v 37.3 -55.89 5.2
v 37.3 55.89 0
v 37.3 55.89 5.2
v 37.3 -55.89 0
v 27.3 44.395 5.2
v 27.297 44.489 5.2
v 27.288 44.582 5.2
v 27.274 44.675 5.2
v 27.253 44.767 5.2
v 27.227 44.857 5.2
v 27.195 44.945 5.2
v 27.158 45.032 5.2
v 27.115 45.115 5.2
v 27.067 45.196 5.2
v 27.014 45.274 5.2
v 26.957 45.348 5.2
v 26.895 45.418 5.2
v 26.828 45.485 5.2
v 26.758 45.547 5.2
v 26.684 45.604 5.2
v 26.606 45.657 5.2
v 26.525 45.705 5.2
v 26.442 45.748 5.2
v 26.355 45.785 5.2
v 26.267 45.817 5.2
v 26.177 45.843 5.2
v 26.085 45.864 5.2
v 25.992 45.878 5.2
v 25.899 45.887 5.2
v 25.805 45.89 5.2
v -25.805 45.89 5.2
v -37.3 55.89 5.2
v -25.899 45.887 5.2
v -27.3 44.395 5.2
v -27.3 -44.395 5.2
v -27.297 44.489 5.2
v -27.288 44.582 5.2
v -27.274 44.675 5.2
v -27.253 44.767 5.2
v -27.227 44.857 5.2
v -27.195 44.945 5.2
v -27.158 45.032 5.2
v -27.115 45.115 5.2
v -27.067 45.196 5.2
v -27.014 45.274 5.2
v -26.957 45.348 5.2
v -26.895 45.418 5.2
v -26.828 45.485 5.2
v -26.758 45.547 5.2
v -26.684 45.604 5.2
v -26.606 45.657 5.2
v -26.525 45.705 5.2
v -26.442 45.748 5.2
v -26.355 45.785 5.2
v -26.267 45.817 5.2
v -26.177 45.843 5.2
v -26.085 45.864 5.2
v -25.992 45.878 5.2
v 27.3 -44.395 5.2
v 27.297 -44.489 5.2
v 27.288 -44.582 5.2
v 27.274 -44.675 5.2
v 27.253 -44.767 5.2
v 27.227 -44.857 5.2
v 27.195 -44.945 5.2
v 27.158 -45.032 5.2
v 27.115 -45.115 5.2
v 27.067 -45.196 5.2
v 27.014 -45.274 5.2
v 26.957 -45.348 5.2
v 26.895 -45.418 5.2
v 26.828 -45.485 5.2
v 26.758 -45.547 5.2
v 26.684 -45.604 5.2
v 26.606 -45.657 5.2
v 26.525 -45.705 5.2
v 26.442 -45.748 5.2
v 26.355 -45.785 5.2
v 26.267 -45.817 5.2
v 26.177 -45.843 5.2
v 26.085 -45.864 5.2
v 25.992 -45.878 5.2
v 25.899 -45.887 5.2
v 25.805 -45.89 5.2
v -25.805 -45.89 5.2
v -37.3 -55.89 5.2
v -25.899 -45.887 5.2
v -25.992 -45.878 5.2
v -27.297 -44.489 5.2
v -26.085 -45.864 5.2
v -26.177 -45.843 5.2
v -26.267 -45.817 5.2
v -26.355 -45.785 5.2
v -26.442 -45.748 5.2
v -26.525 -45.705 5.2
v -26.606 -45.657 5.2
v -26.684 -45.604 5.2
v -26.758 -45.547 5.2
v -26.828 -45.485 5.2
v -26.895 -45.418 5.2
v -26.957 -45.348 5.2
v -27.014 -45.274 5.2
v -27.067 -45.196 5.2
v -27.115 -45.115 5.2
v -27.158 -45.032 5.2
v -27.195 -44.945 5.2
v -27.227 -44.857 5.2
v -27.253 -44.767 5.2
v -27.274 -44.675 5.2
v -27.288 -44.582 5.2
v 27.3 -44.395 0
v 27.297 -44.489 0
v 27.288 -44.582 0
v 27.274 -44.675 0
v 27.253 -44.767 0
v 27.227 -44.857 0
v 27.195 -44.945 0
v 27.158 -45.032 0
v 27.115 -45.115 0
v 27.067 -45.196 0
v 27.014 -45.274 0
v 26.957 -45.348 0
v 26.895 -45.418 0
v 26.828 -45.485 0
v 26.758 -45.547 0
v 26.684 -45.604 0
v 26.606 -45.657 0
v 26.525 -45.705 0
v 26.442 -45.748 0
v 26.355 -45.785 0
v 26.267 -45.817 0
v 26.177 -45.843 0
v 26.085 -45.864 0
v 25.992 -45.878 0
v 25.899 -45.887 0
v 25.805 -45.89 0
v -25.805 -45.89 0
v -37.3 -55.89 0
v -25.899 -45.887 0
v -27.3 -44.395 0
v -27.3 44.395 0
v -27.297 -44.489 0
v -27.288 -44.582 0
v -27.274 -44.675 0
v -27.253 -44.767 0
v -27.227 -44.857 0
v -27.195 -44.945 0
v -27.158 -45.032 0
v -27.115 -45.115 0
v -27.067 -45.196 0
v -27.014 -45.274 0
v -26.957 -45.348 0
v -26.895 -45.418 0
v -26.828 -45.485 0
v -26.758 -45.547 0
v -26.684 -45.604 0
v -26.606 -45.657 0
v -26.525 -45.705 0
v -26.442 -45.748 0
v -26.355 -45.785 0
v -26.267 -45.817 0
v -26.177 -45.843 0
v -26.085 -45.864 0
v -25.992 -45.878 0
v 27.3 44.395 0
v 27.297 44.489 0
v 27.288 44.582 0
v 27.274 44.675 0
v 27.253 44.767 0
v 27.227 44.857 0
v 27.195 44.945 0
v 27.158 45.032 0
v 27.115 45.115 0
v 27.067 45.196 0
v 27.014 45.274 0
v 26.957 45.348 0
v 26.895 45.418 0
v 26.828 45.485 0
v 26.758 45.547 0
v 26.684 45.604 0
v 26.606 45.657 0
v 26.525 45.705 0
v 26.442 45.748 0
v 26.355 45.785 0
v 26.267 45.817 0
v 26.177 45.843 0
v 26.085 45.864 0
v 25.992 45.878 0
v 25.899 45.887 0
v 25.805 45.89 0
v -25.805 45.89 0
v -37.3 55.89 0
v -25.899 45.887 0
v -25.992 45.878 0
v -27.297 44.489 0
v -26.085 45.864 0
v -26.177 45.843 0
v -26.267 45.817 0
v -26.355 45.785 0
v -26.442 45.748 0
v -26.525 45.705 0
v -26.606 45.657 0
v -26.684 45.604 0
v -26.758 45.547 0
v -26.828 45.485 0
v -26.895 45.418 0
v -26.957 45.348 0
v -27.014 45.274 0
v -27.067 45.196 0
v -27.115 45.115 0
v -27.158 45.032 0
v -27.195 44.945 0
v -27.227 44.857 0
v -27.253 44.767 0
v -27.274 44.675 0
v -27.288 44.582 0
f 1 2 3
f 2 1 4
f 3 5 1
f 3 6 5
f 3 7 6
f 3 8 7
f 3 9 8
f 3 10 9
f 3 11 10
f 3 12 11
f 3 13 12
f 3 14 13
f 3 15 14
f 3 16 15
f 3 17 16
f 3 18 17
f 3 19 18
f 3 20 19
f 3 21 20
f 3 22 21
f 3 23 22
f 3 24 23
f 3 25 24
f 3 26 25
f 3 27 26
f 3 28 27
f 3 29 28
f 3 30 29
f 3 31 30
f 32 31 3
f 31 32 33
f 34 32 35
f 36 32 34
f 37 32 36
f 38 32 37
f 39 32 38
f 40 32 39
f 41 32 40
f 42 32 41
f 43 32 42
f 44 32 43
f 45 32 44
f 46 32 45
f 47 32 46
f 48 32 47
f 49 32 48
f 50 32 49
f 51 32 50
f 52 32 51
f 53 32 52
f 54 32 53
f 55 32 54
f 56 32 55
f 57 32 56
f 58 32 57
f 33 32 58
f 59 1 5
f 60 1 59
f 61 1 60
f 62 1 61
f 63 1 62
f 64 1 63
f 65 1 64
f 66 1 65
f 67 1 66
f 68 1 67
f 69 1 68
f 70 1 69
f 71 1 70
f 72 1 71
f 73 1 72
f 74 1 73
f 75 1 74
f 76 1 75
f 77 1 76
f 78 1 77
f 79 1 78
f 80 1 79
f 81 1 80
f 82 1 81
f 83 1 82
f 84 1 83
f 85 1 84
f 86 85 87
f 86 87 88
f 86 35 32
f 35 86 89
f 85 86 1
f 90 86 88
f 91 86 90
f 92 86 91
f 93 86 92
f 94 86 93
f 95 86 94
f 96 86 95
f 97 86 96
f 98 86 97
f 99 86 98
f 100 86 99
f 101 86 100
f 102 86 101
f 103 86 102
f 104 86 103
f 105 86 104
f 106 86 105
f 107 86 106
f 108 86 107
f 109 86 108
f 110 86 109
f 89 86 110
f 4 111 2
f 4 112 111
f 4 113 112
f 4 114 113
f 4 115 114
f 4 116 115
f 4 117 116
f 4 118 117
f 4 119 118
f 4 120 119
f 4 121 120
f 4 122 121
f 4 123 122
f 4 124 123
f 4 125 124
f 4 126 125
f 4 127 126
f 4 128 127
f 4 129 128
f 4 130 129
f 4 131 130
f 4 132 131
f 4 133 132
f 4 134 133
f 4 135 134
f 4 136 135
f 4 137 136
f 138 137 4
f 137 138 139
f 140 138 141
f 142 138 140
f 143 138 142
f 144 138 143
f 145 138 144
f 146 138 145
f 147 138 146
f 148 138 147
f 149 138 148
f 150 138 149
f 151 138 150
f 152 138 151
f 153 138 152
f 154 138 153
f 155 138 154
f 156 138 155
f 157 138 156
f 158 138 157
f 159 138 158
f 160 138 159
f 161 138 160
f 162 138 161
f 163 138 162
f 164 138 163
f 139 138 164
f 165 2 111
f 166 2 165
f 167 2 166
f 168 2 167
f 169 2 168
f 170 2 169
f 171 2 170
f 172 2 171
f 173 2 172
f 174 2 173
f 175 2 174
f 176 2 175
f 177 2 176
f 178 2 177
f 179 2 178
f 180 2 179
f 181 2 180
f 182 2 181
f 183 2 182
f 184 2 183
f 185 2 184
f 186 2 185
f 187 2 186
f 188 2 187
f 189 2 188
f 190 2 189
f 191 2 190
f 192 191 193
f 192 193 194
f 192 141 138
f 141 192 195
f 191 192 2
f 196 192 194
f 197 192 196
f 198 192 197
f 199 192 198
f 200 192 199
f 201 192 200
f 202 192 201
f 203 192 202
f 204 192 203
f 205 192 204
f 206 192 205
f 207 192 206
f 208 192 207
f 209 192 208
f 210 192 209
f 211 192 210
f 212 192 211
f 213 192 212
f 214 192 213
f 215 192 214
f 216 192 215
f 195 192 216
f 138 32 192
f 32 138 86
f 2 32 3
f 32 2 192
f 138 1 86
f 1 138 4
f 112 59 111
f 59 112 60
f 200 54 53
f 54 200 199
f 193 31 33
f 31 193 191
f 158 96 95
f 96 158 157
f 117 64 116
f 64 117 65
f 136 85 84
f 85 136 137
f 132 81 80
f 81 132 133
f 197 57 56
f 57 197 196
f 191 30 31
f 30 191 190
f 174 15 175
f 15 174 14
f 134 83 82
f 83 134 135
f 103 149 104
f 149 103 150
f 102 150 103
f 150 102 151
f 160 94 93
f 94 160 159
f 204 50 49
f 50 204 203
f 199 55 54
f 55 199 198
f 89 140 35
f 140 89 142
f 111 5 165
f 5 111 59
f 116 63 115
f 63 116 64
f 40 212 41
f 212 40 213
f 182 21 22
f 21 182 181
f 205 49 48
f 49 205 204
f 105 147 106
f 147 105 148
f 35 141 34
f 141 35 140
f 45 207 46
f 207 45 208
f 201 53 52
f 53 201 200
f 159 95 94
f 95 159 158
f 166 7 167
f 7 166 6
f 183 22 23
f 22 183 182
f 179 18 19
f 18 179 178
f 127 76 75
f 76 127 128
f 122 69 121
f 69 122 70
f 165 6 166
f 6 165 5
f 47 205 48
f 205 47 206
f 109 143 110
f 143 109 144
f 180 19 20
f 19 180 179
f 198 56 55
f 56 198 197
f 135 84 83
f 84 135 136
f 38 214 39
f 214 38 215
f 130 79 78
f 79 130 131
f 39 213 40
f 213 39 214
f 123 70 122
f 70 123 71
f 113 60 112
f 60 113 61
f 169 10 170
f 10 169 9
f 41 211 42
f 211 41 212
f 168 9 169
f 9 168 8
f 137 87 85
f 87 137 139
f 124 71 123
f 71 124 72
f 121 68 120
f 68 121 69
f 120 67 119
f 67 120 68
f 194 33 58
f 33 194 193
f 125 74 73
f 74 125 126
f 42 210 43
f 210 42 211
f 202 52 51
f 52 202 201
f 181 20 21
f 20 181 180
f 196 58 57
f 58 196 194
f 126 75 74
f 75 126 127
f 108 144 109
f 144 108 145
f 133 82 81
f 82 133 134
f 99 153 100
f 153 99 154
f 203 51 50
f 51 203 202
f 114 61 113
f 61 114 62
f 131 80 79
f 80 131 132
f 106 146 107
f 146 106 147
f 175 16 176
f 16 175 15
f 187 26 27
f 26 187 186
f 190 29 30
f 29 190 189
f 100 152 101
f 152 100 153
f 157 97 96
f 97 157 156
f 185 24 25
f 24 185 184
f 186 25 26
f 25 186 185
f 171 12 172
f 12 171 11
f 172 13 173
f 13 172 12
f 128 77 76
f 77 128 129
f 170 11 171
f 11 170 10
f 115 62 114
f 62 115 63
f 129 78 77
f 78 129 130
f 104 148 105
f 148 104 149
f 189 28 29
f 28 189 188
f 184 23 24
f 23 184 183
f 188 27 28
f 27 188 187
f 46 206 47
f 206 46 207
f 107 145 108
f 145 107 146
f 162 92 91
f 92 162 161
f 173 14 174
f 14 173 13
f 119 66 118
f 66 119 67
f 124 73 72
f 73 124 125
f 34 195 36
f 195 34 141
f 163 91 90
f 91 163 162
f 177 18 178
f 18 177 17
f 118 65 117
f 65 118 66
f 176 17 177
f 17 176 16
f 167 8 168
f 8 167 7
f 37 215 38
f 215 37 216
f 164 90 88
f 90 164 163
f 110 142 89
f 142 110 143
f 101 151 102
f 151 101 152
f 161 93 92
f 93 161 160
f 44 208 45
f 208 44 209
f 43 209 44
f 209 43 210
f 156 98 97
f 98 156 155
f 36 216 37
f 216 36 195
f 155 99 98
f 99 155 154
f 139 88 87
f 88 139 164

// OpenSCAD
/********************************************/
/* A jig for low-voltage wall outlet mounts */
/*                                          */
/*        Created by Jason Hardman          */
/*               2022-05-21                 */
/*                                          */
/********************************************/


$fn = 100;
the_depth = 5.2;
bev_rad = 1.495;
bev_dia = bev_rad * 2;
hole_w = 54.6;
hole_h = 91.78;
boarder = 10;
brdr_offst = boarder * 2;
boarder_w = brdr_offst+hole_w;
boarder_h = brdr_offst+hole_h;


/* Module definitions */
module the_hole(the_x=0, the_y=0, the_z=0) {
  translate([the_x+bev_rad, the_y+bev_rad, the_z]) {
    minkowski(){
      cube([ (hole_w-bev_dia), (hole_h-bev_dia), the_depth]);
      cylinder(r=bev_rad, h=the_depth);
    }
  }
}


module the_boarder(the_x=0, the_y=0, the_z=0) {
  translate([the_x, the_y, the_z]) {
    cube([boarder_w, boarder_h, the_depth]);
  }
}


/* Module calls */
difference() {
  the_boarder(the_x=-(boarder_w/2), the_y=-(boarder_h/2));
  the_hole(the_x=-(hole_w/2), the_y=-(hole_h/2));
}


*translate([0,0,6]){
  color("red") {square([hole_w,hole_h], center = true);}
}
